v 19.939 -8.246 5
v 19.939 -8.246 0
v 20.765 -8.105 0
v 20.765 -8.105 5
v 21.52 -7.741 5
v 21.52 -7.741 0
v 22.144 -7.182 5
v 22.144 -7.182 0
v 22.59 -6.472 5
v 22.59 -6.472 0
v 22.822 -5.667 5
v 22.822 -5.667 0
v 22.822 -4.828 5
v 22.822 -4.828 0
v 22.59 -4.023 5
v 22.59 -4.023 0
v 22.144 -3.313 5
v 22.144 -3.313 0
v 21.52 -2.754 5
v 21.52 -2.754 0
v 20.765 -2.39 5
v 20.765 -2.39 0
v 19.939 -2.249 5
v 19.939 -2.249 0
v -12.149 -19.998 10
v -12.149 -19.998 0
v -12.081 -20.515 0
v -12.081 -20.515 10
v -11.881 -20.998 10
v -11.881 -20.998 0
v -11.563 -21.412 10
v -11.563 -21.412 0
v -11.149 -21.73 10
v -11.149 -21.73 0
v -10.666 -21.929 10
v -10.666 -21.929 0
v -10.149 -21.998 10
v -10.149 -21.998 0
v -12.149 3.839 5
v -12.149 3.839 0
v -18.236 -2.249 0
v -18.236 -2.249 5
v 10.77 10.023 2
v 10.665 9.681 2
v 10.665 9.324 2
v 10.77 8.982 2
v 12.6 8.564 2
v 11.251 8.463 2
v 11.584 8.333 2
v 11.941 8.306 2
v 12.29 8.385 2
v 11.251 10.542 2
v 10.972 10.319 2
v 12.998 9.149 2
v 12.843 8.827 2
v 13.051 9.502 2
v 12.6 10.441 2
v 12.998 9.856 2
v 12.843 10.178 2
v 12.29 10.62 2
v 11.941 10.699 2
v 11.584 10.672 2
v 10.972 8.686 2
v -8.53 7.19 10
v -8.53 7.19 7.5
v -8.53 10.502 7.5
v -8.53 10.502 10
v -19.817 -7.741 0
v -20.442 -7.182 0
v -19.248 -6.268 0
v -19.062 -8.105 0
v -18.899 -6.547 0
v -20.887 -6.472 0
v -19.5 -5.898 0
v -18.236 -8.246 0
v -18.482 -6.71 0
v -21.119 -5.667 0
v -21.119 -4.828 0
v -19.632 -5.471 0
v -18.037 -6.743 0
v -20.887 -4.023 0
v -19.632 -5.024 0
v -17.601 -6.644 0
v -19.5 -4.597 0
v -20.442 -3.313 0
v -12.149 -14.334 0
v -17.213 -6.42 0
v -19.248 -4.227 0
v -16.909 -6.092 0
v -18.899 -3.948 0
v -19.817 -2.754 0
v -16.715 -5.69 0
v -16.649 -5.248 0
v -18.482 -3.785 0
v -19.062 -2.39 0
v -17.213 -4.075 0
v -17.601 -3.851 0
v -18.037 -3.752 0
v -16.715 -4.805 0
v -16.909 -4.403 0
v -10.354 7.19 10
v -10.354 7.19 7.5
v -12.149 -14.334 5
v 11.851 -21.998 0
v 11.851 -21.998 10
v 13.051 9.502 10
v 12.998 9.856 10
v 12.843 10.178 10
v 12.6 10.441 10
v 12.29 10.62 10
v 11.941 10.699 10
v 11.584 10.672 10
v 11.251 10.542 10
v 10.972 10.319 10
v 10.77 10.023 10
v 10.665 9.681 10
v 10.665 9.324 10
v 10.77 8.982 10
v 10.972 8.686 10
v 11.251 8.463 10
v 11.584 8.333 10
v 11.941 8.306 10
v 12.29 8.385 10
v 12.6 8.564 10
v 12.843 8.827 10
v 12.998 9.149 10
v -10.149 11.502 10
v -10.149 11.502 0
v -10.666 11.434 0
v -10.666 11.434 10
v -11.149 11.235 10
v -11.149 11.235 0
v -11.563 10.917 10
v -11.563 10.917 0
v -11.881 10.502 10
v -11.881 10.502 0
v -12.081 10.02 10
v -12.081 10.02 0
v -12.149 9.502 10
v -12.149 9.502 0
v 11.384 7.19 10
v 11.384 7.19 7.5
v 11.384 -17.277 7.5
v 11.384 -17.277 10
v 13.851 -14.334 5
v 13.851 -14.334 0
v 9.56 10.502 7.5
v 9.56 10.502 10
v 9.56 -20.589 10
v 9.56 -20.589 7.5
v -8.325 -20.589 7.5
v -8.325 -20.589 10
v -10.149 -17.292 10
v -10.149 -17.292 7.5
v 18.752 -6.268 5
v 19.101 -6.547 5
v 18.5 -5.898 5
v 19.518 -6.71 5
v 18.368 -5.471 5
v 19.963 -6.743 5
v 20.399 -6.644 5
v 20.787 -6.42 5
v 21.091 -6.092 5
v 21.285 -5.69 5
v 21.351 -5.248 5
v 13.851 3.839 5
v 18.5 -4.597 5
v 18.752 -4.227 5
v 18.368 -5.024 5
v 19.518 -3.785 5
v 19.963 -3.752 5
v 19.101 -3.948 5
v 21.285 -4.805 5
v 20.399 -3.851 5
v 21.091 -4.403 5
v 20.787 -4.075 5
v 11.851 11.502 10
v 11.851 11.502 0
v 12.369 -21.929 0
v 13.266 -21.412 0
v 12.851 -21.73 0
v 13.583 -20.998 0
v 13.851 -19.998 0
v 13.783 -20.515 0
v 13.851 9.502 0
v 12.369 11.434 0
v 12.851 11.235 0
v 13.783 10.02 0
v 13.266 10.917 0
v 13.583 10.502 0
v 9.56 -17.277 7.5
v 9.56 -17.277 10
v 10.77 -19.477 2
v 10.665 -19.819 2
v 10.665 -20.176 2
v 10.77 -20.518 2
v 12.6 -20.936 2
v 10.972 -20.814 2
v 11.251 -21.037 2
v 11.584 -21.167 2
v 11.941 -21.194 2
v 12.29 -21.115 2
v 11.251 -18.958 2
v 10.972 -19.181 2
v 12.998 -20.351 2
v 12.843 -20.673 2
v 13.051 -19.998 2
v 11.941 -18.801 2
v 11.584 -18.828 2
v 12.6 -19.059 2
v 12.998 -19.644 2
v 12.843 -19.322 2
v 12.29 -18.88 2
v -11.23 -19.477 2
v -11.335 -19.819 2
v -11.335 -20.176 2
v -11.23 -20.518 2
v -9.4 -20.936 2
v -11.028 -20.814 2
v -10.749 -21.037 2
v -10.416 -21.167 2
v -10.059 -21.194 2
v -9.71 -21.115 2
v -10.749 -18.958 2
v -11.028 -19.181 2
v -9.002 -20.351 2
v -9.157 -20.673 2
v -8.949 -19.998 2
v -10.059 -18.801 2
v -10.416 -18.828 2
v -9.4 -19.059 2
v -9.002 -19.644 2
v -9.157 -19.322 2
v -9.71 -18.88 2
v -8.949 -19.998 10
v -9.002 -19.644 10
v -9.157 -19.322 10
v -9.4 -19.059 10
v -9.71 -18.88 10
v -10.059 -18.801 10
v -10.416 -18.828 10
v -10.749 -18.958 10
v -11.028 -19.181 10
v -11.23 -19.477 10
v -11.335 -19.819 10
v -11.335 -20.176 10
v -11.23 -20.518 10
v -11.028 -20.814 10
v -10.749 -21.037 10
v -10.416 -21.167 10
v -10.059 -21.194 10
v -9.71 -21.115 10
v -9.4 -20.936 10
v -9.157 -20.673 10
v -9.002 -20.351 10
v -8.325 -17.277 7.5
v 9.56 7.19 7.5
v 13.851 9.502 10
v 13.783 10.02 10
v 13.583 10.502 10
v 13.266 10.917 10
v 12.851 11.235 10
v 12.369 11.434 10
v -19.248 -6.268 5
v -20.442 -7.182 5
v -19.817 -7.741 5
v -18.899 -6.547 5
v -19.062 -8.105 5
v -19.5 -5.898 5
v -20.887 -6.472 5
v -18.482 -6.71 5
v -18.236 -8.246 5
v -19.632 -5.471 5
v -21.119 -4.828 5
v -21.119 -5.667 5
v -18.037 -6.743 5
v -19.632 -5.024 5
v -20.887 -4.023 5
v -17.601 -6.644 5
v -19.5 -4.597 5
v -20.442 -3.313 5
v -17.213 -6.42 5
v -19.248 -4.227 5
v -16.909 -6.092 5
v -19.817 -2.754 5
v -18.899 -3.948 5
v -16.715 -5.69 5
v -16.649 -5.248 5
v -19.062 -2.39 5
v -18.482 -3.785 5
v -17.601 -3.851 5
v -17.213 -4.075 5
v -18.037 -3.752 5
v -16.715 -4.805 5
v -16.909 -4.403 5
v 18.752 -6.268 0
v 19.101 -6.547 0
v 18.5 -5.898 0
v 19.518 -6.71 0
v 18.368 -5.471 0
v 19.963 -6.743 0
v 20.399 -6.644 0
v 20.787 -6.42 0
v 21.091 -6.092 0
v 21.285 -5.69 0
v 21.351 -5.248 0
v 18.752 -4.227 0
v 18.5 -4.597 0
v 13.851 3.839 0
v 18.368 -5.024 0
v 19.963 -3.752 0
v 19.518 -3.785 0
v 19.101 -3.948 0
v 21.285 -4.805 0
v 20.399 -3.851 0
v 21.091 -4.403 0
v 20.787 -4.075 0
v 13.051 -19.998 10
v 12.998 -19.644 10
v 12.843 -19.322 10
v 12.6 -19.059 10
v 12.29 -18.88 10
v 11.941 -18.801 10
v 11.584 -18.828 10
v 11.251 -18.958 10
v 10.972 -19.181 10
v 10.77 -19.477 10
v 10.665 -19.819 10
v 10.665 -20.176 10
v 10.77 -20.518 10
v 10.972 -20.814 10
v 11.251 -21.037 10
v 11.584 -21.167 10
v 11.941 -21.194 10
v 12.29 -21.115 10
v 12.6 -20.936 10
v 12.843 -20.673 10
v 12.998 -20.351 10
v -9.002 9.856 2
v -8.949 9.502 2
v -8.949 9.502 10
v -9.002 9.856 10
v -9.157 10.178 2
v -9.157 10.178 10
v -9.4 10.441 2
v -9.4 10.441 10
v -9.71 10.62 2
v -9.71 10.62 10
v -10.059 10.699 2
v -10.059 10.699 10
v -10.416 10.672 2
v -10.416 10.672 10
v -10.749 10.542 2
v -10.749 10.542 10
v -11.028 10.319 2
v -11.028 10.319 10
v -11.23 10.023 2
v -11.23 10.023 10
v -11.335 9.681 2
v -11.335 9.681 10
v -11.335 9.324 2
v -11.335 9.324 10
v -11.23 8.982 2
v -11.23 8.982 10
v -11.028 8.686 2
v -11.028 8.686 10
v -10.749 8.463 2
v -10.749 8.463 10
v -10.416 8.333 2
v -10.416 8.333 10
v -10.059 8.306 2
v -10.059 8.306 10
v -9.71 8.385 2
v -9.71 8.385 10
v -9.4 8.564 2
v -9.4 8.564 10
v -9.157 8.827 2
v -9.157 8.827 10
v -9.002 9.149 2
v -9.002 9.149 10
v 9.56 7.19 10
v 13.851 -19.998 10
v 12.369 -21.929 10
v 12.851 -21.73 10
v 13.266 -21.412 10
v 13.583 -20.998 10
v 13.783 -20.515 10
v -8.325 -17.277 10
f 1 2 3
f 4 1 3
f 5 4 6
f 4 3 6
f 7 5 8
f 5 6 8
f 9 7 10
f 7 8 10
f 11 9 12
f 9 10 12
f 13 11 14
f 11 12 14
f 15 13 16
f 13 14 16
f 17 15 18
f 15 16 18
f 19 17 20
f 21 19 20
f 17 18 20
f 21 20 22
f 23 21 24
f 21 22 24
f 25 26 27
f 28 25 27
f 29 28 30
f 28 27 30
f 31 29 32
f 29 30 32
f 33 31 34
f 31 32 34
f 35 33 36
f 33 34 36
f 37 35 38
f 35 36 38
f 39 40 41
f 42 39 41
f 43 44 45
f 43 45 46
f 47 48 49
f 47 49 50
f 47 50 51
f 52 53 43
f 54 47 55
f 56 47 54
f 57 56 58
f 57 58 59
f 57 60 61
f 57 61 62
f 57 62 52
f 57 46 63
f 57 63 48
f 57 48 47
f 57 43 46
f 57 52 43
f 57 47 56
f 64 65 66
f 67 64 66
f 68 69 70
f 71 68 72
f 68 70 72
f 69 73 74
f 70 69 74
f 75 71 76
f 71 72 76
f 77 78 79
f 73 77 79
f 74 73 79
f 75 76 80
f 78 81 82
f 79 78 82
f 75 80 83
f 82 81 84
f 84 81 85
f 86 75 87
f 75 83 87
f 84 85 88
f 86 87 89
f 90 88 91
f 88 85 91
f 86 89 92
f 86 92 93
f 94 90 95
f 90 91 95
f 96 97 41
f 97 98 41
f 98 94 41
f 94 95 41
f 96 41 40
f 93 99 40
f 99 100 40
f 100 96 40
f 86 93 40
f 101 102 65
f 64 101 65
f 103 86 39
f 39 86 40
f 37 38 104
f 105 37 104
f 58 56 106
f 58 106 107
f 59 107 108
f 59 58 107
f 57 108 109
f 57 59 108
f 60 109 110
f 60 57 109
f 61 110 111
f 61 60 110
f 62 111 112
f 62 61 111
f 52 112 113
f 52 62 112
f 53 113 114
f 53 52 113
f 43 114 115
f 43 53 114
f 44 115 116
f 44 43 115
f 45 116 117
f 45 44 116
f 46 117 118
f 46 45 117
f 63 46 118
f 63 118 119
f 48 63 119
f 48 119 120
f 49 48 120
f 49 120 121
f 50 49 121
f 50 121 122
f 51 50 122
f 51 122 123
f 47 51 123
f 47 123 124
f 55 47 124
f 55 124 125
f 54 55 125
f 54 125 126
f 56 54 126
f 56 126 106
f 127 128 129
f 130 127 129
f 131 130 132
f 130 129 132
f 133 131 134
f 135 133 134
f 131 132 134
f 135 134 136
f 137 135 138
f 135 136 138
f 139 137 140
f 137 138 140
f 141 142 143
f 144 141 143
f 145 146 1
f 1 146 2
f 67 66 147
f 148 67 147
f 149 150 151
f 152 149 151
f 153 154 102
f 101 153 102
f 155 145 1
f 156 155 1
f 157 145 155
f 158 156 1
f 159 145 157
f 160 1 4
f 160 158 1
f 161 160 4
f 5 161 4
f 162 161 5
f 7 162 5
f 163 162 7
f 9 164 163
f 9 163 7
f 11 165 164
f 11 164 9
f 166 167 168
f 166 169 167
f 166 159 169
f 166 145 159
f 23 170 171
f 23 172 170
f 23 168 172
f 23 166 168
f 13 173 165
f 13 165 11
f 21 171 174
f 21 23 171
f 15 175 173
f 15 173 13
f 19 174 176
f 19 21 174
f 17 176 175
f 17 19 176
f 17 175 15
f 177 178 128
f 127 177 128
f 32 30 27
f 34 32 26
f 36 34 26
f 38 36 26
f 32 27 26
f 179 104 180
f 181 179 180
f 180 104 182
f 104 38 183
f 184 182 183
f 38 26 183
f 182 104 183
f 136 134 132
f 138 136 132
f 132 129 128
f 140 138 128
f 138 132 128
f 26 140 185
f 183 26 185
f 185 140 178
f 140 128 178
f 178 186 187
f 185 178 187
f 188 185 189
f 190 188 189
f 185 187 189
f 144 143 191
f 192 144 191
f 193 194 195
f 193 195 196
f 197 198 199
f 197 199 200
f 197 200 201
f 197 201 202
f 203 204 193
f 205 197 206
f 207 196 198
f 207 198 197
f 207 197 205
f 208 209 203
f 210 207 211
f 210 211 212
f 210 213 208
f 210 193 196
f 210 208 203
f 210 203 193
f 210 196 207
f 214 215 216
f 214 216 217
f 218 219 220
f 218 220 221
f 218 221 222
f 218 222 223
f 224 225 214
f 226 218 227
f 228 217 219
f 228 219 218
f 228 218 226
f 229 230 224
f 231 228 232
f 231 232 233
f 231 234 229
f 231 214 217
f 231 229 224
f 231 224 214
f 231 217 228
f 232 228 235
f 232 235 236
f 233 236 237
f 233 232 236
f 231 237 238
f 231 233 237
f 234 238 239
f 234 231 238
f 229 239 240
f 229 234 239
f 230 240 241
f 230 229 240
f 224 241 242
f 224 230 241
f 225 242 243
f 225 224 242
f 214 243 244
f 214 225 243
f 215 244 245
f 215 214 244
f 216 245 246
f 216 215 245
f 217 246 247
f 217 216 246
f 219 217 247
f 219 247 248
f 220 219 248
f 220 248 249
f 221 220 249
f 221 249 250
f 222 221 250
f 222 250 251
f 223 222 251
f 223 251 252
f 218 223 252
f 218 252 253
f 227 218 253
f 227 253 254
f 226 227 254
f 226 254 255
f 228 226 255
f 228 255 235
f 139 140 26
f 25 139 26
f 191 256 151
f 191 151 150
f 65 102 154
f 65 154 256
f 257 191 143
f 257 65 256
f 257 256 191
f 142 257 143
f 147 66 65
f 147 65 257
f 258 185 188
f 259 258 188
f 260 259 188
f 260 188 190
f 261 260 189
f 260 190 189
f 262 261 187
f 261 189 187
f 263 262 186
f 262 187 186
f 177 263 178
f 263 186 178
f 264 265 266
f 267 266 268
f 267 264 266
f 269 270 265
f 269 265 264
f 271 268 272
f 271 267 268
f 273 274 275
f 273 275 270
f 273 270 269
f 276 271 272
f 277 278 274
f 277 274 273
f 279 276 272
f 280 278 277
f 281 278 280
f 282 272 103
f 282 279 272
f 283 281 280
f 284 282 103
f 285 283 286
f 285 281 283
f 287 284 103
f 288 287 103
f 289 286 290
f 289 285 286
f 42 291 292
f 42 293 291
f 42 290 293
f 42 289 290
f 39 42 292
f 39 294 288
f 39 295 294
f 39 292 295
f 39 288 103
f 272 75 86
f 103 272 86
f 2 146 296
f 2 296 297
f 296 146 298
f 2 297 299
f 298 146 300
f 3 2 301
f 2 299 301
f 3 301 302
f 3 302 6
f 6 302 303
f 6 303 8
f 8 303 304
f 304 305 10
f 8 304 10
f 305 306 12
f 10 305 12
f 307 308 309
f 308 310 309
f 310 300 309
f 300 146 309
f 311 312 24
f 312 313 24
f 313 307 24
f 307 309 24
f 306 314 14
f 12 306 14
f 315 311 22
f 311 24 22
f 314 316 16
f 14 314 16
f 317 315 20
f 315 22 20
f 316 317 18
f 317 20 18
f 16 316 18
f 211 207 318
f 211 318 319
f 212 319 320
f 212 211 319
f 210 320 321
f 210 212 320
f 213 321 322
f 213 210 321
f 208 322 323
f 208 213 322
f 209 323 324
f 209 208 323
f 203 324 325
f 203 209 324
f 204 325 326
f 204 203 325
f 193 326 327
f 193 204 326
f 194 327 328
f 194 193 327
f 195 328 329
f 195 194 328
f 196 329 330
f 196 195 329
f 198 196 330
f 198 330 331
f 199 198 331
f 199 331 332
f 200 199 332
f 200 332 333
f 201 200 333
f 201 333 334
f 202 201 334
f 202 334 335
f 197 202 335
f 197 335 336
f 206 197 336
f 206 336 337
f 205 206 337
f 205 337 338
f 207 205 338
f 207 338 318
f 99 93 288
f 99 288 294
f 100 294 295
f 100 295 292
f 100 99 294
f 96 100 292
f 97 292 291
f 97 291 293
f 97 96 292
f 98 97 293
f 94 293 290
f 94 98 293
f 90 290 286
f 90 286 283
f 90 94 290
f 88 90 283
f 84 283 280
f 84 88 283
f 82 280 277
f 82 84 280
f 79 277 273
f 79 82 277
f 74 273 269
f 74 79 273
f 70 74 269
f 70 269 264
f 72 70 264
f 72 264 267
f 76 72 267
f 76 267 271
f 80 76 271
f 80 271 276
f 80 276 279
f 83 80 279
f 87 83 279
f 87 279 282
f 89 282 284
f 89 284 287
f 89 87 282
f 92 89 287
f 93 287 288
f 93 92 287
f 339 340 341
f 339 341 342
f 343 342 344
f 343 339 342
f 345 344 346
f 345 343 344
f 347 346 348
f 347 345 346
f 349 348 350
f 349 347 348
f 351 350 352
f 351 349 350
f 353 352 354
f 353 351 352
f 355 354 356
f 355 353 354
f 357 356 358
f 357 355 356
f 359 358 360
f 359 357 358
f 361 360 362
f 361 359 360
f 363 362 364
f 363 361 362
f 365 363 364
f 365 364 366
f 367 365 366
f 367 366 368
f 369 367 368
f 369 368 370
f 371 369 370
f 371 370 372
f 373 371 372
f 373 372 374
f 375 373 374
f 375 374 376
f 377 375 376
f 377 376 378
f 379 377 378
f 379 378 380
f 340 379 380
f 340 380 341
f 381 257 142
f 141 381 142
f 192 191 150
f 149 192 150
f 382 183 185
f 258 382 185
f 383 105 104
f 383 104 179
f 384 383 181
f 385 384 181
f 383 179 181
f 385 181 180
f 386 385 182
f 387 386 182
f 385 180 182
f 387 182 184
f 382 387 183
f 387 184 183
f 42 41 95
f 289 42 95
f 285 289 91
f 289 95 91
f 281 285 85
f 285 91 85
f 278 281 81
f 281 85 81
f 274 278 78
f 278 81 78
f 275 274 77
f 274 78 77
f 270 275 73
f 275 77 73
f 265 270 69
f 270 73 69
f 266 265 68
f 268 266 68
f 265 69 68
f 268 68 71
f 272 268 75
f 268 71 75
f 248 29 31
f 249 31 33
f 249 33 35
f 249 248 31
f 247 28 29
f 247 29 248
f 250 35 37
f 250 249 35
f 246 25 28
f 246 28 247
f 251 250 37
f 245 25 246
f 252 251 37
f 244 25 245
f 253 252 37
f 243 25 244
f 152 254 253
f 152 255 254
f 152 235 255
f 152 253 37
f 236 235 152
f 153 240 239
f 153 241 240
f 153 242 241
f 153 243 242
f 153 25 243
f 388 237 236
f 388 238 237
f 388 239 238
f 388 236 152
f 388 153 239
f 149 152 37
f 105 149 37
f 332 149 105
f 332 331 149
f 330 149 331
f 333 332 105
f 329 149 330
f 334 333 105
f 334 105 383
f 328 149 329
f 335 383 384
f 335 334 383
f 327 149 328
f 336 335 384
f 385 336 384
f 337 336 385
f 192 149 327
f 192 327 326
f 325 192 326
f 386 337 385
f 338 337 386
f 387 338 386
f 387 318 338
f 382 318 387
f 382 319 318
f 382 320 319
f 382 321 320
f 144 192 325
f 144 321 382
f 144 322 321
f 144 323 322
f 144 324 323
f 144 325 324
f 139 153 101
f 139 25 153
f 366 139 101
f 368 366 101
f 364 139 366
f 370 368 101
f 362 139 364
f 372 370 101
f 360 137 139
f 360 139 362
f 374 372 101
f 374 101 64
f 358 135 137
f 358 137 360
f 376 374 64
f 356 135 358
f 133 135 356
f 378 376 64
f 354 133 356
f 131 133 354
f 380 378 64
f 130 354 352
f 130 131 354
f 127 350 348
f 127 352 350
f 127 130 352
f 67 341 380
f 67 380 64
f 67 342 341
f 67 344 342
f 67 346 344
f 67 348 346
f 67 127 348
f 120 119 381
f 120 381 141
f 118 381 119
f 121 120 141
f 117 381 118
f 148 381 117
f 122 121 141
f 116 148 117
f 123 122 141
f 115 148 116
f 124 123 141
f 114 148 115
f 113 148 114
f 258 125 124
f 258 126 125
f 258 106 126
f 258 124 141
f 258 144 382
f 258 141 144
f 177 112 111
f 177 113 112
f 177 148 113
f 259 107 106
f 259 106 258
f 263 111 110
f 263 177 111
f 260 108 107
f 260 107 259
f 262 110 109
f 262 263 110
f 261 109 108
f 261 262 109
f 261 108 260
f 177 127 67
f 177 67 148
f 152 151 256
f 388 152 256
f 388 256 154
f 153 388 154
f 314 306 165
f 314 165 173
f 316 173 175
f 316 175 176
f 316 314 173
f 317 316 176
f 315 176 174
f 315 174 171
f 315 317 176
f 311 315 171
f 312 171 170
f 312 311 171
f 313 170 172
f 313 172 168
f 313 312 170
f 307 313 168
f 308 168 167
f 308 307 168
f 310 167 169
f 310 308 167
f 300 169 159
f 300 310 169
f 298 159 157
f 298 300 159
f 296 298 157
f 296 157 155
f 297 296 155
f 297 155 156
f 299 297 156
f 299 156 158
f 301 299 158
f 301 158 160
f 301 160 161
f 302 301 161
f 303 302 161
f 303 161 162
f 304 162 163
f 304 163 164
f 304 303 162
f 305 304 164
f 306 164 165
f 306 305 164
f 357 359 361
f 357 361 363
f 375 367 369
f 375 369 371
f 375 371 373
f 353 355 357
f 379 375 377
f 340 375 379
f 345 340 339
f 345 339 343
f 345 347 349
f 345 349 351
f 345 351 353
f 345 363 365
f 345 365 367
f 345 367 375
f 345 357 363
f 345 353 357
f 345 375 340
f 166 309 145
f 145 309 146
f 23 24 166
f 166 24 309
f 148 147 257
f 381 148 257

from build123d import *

# Parameters (mm, degrees)
F0_R     = 1.5
F1_DEPTH = 5
F0_R_2   = 1.2
F2_DEPTH = 10
F3_DEPTH = 7.5
F4_DEPTH = 2


with BuildPart() as f1:
    # F0 (on Top) → F1 (new body)
    with BuildSketch(Plane.XY):
        with BuildLine():
            Line((-12.148649, -14.333534), (-12.148649, 3.838508))
            Line((-12.148649, 3.838508), (-18.23594, -2.248783))
            ThreePointArc((-18.23594, -2.248783), (-21.148649, -5.247513), (-18.23594, -8.246243))
            Line((-18.23594, -8.246243), (-12.148649, -14.333534))
        make_face()
        with Locations((-18.148649, -5.247513)):
            Circle(F0_R, mode=Mode.SUBTRACT)
        with BuildLine():
            Line((19.938642, -2.248783), (13.851351, 3.838508))
            Line((13.851351, 3.838508), (13.851351, -14.333534))
            Line((13.851351, -14.333534), (19.938642, -8.246243))
            ThreePointArc((19.938642, -8.246243), (22.851351, -5.247513), (19.938642, -2.248783))
        make_face()
        with Locations((19.851351, -5.247513)):
            Circle(F0_R, mode=Mode.SUBTRACT)
    extrude(amount=F1_DEPTH)


with BuildPart() as f2:
    # F0 (on Top) → F2 (new body)
    with BuildSketch(Plane.XY):
        with BuildLine():
            Line((11.851351, 11.502487), (-10.148649, 11.502487))
            ThreePointArc((-10.148649, 11.502487), (-11.562863, 10.916701), (-12.148649, 9.502487))
            Line((-12.148649, 9.502487), (-12.148649, 3.838508))
            Line((-12.148649, 3.838508), (-12.148649, -14.333534))
            Line((-12.148649, -14.333534), (-12.148649, -19.997513))
            ThreePointArc((-12.148649, -19.997513), (-11.562863, -21.411727), (-10.148649, -21.997513))
            Line((-10.148649, -21.997513), (11.851351, -21.997513))
            ThreePointArc((11.851351, -21.997513), (13.265564, -21.411727), (13.851351, -19.997513))
            Line((13.851351, -19.997513), (13.851351, -14.333534))
            Line((13.851351, -14.333534), (13.851351, 3.838508))
            Line((13.851351, 3.838508), (13.851351, 9.502487))
            ThreePointArc((13.851351, 9.502487), (13.265564, 10.916701), (11.851351, 11.502487))
        make_face()
        with Locations((-10.148649, -19.997513)):
            Circle(F0_R_2, mode=Mode.SUBTRACT)
        with Locations((11.851351, -19.997513)):
            Circle(F0_R_2, mode=Mode.SUBTRACT)
        Polygon((-8.529758, 7.190368), (-8.529758, 10.502487), (9.560315, 10.502487), (9.560315, 7.190368), (11.384301, 7.190368), (11.384301, -17.2767), (9.560315, -17.2767), (9.560315, -20.588819), (-8.324727, -20.588819), (-8.324727, -17.2767), (-10.148649, -17.29198), (-10.353744, 7.190368), align=None, mode=Mode.SUBTRACT)
        with Locations((-10.148649, 9.502487)):
            Circle(F0_R_2, mode=Mode.SUBTRACT)
        with Locations((11.851351, 9.502487)):
            Circle(F0_R_2, mode=Mode.SUBTRACT)
    extrude(amount=F2_DEPTH)

    # F0 (on Top) → F3 (join)
    with BuildSketch(Plane.XY):
        Polygon((9.560315, 10.502487), (-8.529758, 10.502487), (-8.529758, 7.190368), (-10.353744, 7.190368), (-10.148649, -17.29198), (-8.324727, -17.2767), (-8.324727, -20.588819), (9.560315, -20.588819), (9.560315, -17.2767), (11.384301, -17.2767), (11.384301, 7.190368), (9.560315, 7.190368), align=None)
    extrude(amount=F3_DEPTH)

    # F0 (on Top) → F4 (join)
    with BuildSketch(Plane.XY):
        with Locations((-10.148649, 9.502487)):
            Circle(F0_R_2)
        with Locations((11.851351, 9.502487)):
            Circle(F0_R_2)
        with Locations((11.851351, -19.997513)):
            Circle(F0_R_2)
        with Locations((-10.148649, -19.997513)):
            Circle(F0_R_2)
    extrude(amount=F4_DEPTH)


solid = Compound([f1.part, f2.part])
